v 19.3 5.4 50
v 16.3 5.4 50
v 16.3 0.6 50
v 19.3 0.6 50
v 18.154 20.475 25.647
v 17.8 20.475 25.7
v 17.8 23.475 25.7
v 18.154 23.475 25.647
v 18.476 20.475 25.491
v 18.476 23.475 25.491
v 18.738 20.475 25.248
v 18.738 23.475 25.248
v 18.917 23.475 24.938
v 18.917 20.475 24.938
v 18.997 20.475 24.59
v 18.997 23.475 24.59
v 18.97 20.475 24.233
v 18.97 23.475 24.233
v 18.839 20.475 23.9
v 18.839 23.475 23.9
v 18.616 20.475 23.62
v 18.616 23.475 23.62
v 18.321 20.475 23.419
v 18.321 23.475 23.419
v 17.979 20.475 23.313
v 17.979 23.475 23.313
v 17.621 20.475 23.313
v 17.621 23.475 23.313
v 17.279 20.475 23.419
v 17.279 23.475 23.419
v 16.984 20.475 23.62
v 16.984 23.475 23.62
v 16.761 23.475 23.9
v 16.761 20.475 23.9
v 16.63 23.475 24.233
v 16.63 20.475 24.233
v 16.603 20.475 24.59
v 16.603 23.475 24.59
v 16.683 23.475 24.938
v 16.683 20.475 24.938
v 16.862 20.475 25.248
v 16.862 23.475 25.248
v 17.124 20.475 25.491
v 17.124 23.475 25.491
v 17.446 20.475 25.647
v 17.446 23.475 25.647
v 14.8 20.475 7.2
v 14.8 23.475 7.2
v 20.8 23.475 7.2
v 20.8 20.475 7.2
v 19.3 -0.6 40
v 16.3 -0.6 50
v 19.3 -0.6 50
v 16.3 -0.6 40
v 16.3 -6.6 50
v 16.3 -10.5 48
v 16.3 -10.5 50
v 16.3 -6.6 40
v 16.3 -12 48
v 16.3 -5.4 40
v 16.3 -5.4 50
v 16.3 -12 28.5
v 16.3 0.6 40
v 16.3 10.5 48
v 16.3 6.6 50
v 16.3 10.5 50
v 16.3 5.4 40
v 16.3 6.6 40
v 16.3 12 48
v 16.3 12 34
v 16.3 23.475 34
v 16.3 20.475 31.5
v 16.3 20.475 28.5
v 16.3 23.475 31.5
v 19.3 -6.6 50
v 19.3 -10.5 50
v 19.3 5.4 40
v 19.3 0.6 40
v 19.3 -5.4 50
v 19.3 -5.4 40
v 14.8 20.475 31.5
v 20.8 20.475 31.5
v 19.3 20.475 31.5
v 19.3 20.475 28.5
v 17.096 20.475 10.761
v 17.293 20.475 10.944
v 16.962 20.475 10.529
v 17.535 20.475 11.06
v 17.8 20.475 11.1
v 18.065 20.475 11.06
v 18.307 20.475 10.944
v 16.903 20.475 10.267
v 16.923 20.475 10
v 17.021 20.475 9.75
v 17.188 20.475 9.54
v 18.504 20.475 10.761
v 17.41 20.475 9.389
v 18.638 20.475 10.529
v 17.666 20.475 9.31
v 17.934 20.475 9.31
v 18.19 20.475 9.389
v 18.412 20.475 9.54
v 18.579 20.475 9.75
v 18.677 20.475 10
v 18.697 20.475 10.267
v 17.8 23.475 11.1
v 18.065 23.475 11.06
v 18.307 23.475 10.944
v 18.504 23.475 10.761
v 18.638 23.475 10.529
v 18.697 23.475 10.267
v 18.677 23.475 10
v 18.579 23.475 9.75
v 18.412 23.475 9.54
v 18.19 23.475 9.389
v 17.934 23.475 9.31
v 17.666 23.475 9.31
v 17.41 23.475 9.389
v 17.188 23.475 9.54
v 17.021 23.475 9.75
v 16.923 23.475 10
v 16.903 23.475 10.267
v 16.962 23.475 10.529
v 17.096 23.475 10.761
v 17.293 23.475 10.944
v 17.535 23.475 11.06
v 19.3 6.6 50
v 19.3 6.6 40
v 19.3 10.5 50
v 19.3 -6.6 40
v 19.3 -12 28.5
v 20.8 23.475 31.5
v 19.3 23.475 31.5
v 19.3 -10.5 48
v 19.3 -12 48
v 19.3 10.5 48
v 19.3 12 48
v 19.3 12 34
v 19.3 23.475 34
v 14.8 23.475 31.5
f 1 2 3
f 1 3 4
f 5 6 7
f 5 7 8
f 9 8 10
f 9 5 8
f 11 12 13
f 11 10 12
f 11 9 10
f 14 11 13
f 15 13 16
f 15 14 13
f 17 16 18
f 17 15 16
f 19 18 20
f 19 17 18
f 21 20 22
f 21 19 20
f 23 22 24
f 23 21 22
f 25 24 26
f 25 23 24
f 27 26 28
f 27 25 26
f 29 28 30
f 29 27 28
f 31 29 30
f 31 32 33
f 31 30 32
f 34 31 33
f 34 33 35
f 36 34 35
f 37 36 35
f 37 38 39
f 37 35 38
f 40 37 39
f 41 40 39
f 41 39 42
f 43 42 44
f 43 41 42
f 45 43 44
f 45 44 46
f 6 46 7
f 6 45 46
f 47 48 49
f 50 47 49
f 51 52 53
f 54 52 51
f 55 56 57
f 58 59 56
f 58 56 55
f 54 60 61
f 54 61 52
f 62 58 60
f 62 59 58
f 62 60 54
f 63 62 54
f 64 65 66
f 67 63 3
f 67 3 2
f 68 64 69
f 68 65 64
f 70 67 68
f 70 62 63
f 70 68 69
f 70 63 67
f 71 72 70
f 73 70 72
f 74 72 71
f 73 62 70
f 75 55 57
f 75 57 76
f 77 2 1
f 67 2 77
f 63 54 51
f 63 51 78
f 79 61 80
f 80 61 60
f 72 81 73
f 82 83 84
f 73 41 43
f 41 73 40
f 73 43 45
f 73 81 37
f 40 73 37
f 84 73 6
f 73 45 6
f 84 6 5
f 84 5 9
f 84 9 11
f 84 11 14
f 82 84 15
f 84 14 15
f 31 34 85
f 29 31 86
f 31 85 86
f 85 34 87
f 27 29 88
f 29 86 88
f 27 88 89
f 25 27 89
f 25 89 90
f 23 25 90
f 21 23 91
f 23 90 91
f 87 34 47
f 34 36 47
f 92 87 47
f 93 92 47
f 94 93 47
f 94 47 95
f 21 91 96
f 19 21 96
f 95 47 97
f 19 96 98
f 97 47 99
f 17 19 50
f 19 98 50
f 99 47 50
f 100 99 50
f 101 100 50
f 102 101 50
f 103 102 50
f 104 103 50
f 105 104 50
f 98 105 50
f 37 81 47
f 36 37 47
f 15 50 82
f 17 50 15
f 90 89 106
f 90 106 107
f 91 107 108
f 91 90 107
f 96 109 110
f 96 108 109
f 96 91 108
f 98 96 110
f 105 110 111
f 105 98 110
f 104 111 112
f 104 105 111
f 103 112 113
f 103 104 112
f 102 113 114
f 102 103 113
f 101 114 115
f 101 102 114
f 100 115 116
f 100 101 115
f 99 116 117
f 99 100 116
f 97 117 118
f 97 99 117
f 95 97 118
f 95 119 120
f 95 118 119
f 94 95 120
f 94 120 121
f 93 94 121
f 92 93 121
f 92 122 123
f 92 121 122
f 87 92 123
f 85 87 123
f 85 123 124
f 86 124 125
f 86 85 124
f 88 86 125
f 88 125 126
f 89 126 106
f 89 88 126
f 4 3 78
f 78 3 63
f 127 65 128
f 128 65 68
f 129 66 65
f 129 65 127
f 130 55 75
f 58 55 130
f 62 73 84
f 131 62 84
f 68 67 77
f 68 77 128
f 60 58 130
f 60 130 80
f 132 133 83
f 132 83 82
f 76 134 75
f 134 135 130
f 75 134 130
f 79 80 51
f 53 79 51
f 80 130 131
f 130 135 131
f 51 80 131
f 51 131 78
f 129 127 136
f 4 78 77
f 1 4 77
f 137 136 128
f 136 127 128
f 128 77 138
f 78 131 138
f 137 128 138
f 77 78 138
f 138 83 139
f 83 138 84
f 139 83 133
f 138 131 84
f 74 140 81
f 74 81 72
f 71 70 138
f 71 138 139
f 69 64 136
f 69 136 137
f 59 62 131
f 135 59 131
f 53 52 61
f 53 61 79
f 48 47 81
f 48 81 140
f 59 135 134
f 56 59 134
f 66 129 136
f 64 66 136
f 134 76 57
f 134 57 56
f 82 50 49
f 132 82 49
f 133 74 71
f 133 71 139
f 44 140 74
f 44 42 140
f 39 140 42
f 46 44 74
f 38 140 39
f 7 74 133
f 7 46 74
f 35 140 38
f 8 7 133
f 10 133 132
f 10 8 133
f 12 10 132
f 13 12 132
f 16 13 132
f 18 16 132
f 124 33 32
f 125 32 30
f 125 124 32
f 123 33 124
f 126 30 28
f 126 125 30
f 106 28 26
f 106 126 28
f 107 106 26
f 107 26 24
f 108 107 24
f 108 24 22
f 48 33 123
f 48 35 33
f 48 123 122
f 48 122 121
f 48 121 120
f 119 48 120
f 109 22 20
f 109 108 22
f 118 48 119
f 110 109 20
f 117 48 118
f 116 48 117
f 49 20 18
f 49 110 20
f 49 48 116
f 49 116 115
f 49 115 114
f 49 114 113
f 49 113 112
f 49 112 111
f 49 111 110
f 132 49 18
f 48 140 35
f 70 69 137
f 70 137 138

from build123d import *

# Parameters (mm, degrees)
BOSS_EXTRUDE1_START     = 7.2
SKETCH1_W               = 6
SKETCH1_H               = 3
BOSS_EXTRUDE1_DEPTH     = 24.3
BOSS_EXTRUDE2_START     = 28.5
SKETCH2_W               = 3
SKETCH2_H               = 35.475
BOSS_EXTRUDE2_DEPTH     = 21.5
CUT_EXTRUDE1_DEPTH      = 60.023009285
CUT_EXTRUDE1_DEPTH_BACK = 60.023009285
SKETCH3_R               = 1.2
SKETCH3_R_2             = 0.9
CUT_EXTRUDE2_DEPTH      = 60.023009285
CUT_EXTRUDE2_DEPTH_BACK = 60.023009285
SKETCH4_W               = 11
SKETCH4_H               = 1.2
SKETCH4_W_2             = 17
SKETCH4_H_2             = 12.475
CUT_EXTRUDE3_DEPTH      = 60.023009285
CUT_EXTRUDE3_DEPTH_BACK = 60.023009285
SKETCH5_W               = 3
SKETCH5_H               = 2.5


with BuildPart() as part:
    # Sketch1 → Boss-Extrude1 (new body)
    with BuildSketch(Plane.XY.offset(BOSS_EXTRUDE1_START)):
        with Locations((17.8, 21.975)):
            Rectangle(SKETCH1_W, SKETCH1_H)
    extrude(amount=BOSS_EXTRUDE1_DEPTH)

    # Sketch2 → Boss-Extrude2 (add)
    with BuildSketch(Plane.XY.offset(BOSS_EXTRUDE2_START)):
        with Locations((17.8, 5.7375)):
            Rectangle(SKETCH2_W, SKETCH2_H)
    extrude(amount=BOSS_EXTRUDE2_DEPTH)

    # Sketch3 → Cut-Extrude1 (cut, two sides: drawn at the far end of the back side and taken through both)
    with BuildSketch(Plane(origin=(0, 0, 0), x_dir=(1, 0, 0), z_dir=(0, 1, 0)).offset(-CUT_EXTRUDE1_DEPTH_BACK)):
        with Locations(Location((17.8, -24.5, 0), (0, 0, 270))):
            Circle(SKETCH3_R)
        with Locations(Location((17.8, -10.2, 0), (0, 0, 270))):
            Circle(SKETCH3_R_2)
    extrude(amount=CUT_EXTRUDE1_DEPTH + CUT_EXTRUDE1_DEPTH_BACK, mode=Mode.SUBTRACT)

    # Sketch4 → Cut-Extrude2 (cut, two sides: drawn at the far end of the back side and taken through both)
    with BuildSketch(Plane(origin=(0, 0, 0), x_dir=(0, 0, -1), z_dir=(1, 0, 0)).offset(-CUT_EXTRUDE2_DEPTH_BACK)):
        with Locations((-45.5, -6)):
            Rectangle(SKETCH4_W, SKETCH4_H)
        with Locations((-45.5, 0)):
            Rectangle(SKETCH4_W, SKETCH4_H)
        with Locations((-45.5, 6)):
            Rectangle(SKETCH4_W, SKETCH4_H)
        with Locations((-42.5, 18.2375)):
            Rectangle(SKETCH4_W_2, SKETCH4_H_2)
    extrude(amount=CUT_EXTRUDE2_DEPTH + CUT_EXTRUDE2_DEPTH_BACK, mode=Mode.SUBTRACT)

    # Sketch5 → Cut-Extrude3 (cut, two sides: drawn at the far end of the back side and taken through both)
    with BuildSketch(Plane(origin=(0, 0, 0), x_dir=(0, 0, -1), z_dir=(1, 0, 0)).offset(-CUT_EXTRUDE3_DEPTH_BACK)):
        with Locations((-49.5, -11.75)):
            Rectangle(SKETCH5_W, SKETCH5_H)
        with Locations((-49.5, 11.75)):
            Rectangle(SKETCH5_W, SKETCH5_H)
    extrude(amount=CUT_EXTRUDE3_DEPTH + CUT_EXTRUDE3_DEPTH_BACK, mode=Mode.SUBTRACT)


solid = part.part
